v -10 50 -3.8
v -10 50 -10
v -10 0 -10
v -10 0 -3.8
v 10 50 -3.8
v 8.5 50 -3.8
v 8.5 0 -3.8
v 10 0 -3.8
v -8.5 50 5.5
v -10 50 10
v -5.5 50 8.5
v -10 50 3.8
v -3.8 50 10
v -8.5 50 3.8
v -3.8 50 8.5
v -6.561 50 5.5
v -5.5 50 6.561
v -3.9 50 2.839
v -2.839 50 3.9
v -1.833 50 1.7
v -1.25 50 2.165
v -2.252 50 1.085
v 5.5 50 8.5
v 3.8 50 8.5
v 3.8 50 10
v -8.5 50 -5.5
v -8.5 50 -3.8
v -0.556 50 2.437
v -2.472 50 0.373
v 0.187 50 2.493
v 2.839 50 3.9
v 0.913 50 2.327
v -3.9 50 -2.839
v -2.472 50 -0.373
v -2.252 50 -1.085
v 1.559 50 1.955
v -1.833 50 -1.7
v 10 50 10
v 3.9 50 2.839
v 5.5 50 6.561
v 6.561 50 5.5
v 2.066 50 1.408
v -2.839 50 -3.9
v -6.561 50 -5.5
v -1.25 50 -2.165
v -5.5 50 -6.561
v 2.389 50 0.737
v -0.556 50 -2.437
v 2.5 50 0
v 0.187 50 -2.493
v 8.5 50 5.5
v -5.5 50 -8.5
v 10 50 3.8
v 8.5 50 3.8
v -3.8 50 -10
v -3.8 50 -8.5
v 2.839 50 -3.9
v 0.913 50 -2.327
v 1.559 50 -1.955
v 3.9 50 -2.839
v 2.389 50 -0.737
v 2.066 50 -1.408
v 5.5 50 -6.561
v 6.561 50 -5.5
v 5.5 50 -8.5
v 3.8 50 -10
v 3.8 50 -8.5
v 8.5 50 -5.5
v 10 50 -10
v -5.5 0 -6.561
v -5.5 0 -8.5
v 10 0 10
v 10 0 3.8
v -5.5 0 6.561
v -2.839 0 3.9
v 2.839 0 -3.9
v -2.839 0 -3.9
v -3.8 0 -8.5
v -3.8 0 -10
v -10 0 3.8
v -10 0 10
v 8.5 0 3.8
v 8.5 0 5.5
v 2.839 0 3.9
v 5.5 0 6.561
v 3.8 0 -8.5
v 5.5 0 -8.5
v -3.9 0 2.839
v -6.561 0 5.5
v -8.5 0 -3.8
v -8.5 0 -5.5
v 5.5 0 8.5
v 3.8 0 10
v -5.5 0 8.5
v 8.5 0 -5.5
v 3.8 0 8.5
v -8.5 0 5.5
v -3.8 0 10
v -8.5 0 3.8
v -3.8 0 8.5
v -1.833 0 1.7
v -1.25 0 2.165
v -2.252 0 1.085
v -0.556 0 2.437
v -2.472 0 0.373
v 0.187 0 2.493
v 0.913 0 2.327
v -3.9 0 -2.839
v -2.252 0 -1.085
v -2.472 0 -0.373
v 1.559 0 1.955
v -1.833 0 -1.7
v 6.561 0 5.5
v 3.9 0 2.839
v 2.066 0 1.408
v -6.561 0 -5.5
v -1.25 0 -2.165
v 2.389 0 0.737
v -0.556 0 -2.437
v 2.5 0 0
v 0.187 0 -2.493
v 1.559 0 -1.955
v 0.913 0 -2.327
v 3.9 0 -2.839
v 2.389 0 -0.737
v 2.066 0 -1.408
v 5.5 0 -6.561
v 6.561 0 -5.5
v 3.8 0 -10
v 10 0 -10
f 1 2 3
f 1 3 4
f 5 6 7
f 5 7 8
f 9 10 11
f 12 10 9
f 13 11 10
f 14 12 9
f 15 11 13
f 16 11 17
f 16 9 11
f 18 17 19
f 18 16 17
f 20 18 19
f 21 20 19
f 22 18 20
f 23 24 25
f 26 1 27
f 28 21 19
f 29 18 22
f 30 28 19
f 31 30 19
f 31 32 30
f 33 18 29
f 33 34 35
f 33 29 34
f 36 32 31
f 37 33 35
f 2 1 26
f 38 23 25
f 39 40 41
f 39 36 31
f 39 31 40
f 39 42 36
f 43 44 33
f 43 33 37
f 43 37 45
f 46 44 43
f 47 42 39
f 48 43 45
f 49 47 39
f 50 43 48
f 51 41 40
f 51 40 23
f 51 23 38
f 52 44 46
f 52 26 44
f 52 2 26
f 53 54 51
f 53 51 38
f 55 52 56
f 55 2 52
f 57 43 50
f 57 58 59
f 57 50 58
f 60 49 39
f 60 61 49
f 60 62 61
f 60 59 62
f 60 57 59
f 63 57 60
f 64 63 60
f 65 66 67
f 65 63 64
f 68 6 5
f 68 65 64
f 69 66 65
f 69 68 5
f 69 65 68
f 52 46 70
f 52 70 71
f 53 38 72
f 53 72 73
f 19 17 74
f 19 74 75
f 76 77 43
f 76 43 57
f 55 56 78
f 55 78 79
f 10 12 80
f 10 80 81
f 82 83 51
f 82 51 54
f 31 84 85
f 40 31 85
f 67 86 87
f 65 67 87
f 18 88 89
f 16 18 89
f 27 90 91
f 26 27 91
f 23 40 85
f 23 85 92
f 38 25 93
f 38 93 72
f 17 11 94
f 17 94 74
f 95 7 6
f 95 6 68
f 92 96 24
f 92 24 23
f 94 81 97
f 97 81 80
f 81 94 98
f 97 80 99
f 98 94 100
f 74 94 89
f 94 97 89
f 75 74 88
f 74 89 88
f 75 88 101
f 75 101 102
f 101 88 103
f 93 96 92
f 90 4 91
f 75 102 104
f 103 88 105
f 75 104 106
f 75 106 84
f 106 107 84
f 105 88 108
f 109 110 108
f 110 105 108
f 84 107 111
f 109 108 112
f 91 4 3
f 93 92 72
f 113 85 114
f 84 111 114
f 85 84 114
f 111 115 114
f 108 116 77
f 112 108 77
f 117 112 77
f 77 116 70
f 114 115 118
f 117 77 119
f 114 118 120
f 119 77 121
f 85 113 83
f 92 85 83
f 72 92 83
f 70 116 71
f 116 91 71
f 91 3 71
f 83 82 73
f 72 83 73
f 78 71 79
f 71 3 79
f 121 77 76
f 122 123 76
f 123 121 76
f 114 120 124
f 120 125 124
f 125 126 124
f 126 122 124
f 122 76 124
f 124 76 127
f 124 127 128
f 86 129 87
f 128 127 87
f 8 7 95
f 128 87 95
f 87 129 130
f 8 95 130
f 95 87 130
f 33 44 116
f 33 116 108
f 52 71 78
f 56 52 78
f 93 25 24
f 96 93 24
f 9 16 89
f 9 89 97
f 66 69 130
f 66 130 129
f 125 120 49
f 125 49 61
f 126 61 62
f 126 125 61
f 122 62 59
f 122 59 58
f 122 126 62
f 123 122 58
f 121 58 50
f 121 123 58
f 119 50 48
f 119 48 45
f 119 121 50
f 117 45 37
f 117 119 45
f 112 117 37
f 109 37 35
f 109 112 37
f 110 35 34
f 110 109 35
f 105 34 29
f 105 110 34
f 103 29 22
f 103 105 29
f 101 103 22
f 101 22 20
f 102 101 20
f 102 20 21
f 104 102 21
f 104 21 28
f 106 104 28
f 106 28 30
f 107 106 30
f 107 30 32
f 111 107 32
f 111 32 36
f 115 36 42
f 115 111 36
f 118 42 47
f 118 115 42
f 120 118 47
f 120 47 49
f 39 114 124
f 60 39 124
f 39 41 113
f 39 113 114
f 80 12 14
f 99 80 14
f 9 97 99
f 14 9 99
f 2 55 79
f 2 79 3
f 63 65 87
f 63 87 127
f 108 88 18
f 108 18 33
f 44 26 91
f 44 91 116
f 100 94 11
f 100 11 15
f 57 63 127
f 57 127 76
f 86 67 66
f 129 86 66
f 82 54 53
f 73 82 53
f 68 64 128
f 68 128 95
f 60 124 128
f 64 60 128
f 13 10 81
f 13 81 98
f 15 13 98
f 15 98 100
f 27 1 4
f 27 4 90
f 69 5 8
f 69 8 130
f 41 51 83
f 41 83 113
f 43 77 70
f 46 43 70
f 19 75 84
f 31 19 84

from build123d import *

# Parameters (mm, degrees)
SKETCH_1_W      = 1.5
SKETCH_1_H      = 1.7
SKETCH_1_W_2    = 1.7
SKETCH_1_H_2    = 1.5
SKETCH_1_W_3    = 7.8
SKETCH_1_H_3    = 7.8
SKETCH_1_R      = 2.5
EXTRUDE_1_DEPTH = 50


with BuildPart() as part:
    # 草图1 → 凸台-拉伸1 (new body)
    with BuildSketch(Plane(origin=(0, 0, 0), x_dir=(1, 0, 0), z_dir=(0, 1, 0))):
        Polygon((5.5, 8.5), (5.5, 6.560660172), (5.5, 5.5), (6.560660172, 5.5), (8.5, 5.5), (10, 5.5), (10, 10), (5.5, 10), align=None)
        with Locations((9.25, 4.65)):
            Rectangle(SKETCH_1_W, SKETCH_1_H)
        Polygon((5.5, 6.560660172), (2.839339828, 3.9), (3.9, 3.9), (3.9, 2.839339828), (6.560660172, 5.5), (5.5, 5.5), align=None)
        with Locations((4.65, 9.25)):
            Rectangle(SKETCH_1_W_2, SKETCH_1_H_2)
        Rectangle(SKETCH_1_W_3, SKETCH_1_H_3)
        Circle(SKETCH_1_R, mode=Mode.SUBTRACT)
        with Locations((-4.65, 9.25)):
            Rectangle(SKETCH_1_W_2, SKETCH_1_H_2)
        Polygon((-8.5, 5.5), (-6.560660172, 5.5), (-5.5, 5.5), (-5.5, 6.560660172), (-5.5, 8.5), (-5.5, 10), (-10, 10), (-10, 5.5), align=None)
        with Locations((-9.25, 4.65)):
            Rectangle(SKETCH_1_W, SKETCH_1_H)
        Polygon((-5.5, 5.5), (-6.560660172, 5.5), (-3.9, 2.839339828), (-3.9, 3.9), (-2.839339828, 3.9), (-5.5, 6.560660172), align=None)
        Polygon((-5.5, -5.5), (-6.560660172, -5.5), (-8.5, -5.5), (-10, -5.5), (-10, -10), (-5.5, -10), (-5.5, -8.5), (-5.5, -6.560660172), align=None)
        with Locations((-4.65, -9.25)):
            Rectangle(SKETCH_1_W_2, SKETCH_1_H_2)
        with Locations((-9.25, -4.65)):
            Rectangle(SKETCH_1_W, SKETCH_1_H)
        Polygon((-3.9, -3.9), (-3.9, -2.839339828), (-6.560660172, -5.5), (-5.5, -5.5), (-5.5, -6.560660172), (-2.839339828, -3.9), align=None)
        Polygon((3.9, -3.9), (2.839339828, -3.9), (5.5, -6.560660172), (5.5, -5.5), (6.560660172, -5.5), (3.9, -2.839339828), align=None)
        Polygon((5.5, -5.5), (5.5, -6.560660172), (5.5, -8.5), (5.5, -10), (10, -10), (10, -5.5), (8.5, -5.5), (6.560660172, -5.5), align=None)
        with Locations((9.25, -4.65)):
            Rectangle(SKETCH_1_W, SKETCH_1_H)
        with Locations((4.65, -9.25)):
            Rectangle(SKETCH_1_W_2, SKETCH_1_H_2)
    extrude(amount=EXTRUDE_1_DEPTH)


solid = part.part
